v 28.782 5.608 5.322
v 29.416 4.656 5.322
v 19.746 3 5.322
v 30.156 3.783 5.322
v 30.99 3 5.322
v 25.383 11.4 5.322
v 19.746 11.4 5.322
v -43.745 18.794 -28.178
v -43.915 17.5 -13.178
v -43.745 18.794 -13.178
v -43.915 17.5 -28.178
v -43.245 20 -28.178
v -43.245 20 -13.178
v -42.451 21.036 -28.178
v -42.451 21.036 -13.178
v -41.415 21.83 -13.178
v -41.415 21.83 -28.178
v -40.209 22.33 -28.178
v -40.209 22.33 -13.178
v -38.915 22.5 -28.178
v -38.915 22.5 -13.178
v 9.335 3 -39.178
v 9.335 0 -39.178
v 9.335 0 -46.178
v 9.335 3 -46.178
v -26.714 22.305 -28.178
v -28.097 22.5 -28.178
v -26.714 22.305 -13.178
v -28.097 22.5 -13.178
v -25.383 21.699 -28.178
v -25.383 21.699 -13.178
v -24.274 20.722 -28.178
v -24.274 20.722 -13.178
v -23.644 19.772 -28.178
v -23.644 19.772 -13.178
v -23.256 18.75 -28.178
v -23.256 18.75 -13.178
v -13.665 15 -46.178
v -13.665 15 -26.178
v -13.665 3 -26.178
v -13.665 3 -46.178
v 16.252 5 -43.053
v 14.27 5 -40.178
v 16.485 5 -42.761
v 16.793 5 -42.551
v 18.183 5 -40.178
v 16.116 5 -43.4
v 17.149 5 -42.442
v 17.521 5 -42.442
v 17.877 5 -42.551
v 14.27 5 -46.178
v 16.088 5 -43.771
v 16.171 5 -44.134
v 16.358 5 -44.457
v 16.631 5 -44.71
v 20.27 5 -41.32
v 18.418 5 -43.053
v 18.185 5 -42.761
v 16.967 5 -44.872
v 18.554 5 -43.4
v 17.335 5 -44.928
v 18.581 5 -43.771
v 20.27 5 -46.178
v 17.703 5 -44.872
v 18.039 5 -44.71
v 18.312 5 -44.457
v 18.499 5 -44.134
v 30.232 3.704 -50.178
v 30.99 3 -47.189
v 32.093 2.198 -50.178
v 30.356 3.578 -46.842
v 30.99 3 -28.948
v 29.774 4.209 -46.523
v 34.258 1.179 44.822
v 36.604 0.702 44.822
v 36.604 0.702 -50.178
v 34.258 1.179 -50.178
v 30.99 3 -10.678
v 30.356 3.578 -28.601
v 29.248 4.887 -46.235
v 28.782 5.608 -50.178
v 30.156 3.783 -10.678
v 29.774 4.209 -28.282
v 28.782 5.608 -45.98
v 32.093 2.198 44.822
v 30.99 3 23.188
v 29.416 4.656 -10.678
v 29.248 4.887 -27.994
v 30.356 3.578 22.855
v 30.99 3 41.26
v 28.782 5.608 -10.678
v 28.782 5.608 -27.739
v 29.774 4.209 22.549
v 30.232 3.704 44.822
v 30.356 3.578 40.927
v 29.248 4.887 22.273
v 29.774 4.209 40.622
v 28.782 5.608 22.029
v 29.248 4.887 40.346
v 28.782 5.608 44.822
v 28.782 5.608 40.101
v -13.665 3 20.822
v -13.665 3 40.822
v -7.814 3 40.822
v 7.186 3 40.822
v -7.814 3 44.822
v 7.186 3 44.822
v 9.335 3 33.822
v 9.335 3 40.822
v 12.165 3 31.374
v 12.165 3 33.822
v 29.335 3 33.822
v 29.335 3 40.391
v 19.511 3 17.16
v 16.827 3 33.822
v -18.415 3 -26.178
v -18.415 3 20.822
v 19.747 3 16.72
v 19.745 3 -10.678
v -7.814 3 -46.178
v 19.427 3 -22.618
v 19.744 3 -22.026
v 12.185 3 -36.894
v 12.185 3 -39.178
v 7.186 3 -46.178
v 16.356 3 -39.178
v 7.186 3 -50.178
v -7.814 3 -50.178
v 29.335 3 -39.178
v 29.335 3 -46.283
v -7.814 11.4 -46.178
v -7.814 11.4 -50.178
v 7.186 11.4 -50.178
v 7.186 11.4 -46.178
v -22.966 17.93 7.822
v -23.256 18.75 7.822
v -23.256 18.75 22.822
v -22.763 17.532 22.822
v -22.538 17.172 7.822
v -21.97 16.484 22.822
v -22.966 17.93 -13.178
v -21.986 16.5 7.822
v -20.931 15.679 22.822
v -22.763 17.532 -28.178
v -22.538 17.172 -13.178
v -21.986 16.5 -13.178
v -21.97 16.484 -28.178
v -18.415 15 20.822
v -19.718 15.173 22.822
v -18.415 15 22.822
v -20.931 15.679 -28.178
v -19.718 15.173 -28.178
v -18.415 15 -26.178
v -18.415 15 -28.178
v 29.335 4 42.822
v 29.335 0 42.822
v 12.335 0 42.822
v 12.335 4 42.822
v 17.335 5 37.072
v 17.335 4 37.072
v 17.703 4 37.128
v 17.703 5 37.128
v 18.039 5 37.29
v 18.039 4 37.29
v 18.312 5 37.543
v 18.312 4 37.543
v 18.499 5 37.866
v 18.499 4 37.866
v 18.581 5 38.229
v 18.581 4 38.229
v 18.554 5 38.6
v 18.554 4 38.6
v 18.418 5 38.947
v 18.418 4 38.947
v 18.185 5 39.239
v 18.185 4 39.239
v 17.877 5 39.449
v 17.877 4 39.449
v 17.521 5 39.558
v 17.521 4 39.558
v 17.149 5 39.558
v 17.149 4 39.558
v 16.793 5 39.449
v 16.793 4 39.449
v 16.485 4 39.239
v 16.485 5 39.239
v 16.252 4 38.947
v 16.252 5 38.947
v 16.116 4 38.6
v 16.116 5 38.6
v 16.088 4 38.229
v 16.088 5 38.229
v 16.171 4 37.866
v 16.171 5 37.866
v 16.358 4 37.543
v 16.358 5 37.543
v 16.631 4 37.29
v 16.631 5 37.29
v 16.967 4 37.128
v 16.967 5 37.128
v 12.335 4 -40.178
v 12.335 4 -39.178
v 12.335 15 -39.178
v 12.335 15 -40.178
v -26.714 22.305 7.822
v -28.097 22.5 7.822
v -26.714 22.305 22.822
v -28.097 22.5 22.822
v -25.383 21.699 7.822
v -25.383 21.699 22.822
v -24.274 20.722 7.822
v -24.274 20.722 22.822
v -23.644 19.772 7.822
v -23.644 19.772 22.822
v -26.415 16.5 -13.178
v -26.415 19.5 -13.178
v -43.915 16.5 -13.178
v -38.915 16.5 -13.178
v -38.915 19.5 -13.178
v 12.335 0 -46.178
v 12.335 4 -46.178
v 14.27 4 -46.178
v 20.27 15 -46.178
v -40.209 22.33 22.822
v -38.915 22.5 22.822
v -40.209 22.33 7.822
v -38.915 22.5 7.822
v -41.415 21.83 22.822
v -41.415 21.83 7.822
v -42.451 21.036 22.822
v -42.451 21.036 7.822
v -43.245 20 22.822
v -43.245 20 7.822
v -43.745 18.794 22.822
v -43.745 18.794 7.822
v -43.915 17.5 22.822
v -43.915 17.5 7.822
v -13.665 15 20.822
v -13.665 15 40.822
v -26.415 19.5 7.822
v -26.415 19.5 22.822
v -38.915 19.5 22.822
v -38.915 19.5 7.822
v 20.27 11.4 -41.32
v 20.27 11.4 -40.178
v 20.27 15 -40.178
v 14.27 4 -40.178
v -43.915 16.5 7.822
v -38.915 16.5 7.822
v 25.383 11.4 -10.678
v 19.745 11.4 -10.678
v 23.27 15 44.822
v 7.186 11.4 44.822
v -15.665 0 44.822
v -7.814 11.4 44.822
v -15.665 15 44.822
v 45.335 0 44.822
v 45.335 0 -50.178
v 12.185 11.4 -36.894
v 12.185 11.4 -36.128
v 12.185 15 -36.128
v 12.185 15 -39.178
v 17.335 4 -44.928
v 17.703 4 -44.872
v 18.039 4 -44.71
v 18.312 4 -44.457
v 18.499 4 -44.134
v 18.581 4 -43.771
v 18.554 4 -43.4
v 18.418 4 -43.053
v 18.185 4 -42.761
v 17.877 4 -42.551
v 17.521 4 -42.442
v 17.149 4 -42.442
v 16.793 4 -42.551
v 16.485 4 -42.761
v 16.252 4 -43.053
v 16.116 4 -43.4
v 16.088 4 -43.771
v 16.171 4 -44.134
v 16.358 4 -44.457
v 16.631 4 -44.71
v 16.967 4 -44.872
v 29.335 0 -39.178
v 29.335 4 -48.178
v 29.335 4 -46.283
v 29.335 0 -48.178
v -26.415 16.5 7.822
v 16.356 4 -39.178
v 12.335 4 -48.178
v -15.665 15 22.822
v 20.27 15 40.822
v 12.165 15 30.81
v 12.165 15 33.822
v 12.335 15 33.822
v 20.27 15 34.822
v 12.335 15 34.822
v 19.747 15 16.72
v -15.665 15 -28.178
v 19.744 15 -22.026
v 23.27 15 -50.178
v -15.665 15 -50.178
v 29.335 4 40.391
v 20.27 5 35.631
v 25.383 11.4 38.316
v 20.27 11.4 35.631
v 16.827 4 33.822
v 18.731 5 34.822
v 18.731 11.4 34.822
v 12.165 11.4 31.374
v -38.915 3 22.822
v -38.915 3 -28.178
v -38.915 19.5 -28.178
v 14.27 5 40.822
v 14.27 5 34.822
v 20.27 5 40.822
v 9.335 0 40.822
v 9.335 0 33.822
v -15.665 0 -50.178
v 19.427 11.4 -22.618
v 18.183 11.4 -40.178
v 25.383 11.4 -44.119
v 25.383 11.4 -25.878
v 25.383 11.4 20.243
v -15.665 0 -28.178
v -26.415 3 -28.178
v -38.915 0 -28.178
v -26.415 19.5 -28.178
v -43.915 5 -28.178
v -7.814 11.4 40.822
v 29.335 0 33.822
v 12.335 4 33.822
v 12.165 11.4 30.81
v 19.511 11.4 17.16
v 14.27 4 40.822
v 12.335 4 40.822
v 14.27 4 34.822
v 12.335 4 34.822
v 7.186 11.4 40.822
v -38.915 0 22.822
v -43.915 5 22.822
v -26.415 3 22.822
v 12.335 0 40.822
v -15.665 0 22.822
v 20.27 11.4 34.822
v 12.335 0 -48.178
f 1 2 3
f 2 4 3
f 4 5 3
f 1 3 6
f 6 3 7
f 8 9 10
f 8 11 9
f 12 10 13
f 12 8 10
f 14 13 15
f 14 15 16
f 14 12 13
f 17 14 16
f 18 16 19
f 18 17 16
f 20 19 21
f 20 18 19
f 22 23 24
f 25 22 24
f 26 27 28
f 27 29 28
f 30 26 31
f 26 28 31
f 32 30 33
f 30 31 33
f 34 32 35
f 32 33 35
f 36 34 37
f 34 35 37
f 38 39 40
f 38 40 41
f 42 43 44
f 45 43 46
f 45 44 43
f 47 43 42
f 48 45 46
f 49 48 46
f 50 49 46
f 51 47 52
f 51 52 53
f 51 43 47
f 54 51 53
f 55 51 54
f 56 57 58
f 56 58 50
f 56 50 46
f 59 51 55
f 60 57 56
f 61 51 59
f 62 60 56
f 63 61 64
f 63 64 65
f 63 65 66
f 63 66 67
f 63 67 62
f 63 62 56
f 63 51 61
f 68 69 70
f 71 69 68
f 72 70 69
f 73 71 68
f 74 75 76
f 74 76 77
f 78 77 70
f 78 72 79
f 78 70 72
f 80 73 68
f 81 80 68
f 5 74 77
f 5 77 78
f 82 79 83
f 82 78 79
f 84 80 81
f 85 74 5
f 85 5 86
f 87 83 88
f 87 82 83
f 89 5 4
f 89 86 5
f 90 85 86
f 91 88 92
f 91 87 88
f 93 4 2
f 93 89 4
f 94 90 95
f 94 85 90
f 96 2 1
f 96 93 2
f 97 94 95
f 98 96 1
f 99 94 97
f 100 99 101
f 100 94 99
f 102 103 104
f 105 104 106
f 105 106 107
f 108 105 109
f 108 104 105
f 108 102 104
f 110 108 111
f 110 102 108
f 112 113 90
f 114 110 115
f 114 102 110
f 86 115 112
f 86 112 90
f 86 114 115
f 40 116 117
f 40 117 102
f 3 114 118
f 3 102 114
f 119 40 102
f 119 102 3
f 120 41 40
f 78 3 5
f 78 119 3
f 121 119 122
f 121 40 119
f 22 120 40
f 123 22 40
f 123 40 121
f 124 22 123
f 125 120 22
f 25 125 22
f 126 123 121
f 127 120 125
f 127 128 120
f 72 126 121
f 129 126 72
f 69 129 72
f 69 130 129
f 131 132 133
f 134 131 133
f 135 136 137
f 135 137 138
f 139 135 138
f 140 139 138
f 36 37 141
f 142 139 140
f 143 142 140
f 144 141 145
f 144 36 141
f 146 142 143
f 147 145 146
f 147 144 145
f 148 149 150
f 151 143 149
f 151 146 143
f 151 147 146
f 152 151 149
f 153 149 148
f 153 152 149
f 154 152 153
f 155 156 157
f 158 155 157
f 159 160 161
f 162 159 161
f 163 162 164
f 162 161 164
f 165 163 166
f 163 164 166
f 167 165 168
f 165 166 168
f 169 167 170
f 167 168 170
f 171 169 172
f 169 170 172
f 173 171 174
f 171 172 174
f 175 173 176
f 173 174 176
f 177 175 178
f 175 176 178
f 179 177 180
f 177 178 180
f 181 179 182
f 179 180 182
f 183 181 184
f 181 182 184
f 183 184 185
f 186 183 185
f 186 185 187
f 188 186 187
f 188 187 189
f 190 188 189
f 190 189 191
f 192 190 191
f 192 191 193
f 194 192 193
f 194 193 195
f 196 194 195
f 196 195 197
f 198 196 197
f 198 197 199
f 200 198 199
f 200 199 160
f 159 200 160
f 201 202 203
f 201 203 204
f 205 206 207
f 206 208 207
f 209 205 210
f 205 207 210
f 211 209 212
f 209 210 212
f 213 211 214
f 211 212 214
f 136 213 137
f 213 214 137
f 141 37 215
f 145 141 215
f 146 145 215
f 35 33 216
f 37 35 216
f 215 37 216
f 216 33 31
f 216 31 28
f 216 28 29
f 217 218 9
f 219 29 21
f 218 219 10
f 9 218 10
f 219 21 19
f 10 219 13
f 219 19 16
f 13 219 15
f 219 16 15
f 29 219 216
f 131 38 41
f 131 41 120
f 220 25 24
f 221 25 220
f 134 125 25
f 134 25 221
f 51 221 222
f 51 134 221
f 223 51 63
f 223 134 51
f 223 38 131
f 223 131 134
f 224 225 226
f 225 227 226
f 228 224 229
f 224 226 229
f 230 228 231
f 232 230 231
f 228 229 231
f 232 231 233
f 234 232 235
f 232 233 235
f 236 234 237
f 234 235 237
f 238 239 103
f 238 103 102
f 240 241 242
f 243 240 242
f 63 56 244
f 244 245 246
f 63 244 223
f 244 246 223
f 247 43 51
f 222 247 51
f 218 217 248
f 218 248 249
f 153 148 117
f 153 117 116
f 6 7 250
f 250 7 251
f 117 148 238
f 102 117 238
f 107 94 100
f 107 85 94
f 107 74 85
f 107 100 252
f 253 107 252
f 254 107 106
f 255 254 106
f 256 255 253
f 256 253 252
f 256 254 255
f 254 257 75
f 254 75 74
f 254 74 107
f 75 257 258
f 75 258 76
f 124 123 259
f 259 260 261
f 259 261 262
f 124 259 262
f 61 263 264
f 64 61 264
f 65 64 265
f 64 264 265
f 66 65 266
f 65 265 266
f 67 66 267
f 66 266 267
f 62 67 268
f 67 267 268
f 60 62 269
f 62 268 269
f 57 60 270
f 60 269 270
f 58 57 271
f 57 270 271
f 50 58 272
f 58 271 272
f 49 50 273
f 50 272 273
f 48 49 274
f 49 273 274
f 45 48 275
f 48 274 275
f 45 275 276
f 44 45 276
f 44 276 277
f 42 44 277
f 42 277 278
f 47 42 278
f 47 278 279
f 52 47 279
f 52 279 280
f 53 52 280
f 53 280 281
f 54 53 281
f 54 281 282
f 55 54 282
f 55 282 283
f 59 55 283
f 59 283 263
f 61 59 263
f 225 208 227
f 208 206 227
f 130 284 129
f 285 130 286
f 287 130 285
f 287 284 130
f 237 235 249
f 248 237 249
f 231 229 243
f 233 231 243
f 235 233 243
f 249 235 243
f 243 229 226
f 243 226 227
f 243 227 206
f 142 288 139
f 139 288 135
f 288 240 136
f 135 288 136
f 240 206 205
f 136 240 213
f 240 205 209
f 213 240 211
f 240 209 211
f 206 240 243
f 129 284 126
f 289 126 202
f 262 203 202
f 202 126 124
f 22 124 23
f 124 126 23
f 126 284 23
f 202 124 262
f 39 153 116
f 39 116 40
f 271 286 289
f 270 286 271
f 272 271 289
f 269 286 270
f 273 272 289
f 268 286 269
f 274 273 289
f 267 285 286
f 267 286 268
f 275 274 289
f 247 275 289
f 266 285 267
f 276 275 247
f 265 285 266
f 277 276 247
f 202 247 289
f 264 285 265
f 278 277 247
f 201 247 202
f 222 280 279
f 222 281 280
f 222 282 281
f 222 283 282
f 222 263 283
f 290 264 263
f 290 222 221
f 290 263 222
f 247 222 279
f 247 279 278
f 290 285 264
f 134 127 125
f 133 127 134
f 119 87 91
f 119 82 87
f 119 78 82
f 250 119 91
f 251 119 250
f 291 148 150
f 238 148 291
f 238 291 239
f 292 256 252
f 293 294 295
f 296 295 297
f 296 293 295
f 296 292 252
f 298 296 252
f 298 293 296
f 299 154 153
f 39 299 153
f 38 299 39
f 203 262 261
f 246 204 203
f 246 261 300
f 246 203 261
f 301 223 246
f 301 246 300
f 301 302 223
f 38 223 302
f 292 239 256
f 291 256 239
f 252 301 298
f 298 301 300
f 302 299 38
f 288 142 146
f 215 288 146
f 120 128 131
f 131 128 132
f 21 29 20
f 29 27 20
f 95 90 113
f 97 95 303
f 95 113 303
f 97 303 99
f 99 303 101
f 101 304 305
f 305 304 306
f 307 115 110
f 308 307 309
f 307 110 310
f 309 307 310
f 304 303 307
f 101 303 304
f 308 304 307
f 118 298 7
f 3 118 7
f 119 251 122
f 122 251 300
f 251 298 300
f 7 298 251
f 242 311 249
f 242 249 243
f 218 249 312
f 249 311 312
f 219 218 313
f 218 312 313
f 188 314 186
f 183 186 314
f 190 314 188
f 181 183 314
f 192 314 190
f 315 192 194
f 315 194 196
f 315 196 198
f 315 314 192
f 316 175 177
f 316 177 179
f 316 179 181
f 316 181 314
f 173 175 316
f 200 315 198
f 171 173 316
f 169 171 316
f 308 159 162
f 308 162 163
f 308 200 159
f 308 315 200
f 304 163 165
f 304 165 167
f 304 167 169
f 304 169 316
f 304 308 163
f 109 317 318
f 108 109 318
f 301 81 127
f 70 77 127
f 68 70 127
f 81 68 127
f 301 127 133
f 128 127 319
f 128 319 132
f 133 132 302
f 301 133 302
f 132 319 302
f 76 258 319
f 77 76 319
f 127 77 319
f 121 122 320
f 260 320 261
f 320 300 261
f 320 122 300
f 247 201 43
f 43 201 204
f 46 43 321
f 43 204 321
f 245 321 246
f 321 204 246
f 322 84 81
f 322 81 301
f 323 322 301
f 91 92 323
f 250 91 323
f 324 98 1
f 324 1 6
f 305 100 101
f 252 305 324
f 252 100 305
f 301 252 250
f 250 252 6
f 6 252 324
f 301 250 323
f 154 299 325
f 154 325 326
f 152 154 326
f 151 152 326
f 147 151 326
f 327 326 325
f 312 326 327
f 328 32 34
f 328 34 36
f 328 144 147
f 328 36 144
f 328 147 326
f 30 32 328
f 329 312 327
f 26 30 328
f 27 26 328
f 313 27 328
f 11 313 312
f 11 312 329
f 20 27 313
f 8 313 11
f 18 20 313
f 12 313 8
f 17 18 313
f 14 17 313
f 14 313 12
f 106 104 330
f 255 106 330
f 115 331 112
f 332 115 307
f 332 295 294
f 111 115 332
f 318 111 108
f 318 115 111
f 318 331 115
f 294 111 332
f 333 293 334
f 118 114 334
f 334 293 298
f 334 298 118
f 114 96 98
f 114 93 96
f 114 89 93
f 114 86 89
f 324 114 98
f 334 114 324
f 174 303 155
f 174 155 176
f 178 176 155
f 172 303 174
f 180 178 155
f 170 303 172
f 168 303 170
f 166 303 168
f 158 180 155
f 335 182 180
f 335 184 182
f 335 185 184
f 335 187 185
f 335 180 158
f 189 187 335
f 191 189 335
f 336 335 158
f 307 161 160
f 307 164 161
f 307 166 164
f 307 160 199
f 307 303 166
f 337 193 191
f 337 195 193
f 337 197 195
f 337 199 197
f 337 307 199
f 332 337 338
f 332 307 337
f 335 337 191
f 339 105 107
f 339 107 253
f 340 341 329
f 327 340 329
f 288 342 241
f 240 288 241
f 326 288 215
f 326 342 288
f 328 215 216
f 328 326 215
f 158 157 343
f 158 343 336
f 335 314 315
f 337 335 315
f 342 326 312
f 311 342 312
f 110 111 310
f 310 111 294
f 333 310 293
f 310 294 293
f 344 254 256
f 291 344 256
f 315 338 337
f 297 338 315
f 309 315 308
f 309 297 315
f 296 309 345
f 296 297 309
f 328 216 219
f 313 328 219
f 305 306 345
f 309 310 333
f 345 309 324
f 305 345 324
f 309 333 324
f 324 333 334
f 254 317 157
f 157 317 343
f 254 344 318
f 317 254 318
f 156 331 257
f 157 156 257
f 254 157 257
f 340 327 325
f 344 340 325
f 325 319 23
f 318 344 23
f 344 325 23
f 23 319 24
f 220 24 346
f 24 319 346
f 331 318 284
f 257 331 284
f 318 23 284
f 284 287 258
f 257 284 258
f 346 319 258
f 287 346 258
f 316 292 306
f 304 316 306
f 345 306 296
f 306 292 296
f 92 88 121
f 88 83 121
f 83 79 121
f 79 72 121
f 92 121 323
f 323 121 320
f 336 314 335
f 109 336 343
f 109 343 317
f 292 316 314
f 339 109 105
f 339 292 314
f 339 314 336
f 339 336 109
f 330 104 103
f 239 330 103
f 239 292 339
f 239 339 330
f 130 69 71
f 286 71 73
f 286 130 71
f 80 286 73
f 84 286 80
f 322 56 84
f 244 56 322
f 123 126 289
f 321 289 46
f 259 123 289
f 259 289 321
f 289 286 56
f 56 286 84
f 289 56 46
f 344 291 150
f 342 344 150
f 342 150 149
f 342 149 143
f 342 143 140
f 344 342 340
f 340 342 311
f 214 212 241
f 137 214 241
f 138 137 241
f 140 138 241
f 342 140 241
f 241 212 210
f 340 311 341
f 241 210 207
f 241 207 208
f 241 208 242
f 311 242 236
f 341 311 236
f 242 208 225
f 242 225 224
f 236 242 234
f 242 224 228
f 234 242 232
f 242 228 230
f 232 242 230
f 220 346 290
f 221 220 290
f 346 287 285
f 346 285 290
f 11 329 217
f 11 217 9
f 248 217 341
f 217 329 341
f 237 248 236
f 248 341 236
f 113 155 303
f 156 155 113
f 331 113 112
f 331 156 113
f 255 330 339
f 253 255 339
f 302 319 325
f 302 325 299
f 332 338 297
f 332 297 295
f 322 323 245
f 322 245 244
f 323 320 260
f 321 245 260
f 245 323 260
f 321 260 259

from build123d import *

# Parameters (mm, degrees)
SKETCH1_W                = 95
SKETCH1_H                = 95
BOSS_EXTRUDE1_DEPTH      = 20
SKETCH2_W                = 15
SKETCH2_H                = 8.4
CUT_EXTRUDE1_DEPTH       = 50
CUT_EXTRUDE3_DEPTH       = 100
FILLET1_R                = 10
CUT_EXTRUDE4_DEPTH       = 17
SKETCH8_W                = 15
SKETCH8_H                = 8.4
CUT_EXTRUDE5_DEPTH       = 4
SKETCH9_W                = 15
SKETCH9_H                = 8.4
CUT_EXTRUDE6_DEPTH       = 4
SKETCH10_W               = 15
SKETCH10_H               = 8.4
CUT_EXTRUDE7_DEPTH       = 100
SKETCH11_W               = 15
SKETCH11_H               = 8.4
CUT_EXTRUDE8_DEPTH       = 100
SKETCH12_W               = 96.22761595
SKETCH12_H               = 5
CUT_EXTRUDE9_DEPTH       = 100
SKETCH14_W               = 16
SKETCH14_H               = 8.4
CUT_EXTRUDE10_DEPTH      = 100
SKETCH15_W               = 16
SKETCH15_H               = 8.4
CUT_EXTRUDE11_DEPTH      = 100
SKETCH16_W               = 16
SKETCH16_H               = 8.4
CUT_EXTRUDE13_DEPTH      = 100
CUT_EXTRUDE16_DEPTH      = 12
SKETCH21_W               = 23.779532914
SKETCH21_H               = 2
BOSS_EXTRUDE2_DEPTH      = 12
SKETCH23_W               = 23.759878039
SKETCH23_H               = 2
BOSS_EXTRUDE3_DEPTH      = 12
CUT_EXTRUDE19_DEPTH      = 100
CUT_EXTRUDE19_DEPTH_BACK = 100
SKETCH24_W               = 15
SKETCH24_H               = 8.4
SKETCH26_W               = 20
SKETCH26_H               = 95
BOSS_EXTRUDE4_DEPTH      = 20
SKETCH31_W               = 95
SKETCH31_H               = 20
BOSS_EXTRUDE6_DEPTH      = 10
SKETCH32_W               = 12.5
SKETCH32_H               = 16.5
CUT_EXTRUDE22_DEPTH      = 100
SKETCH33_W               = 3.75
SKETCH33_H               = 20
CUT_EXTRUDE23_DEPTH      = 100
SKETCH34_W               = 26.25
SKETCH34_H               = 12.5
CUT_EXTRUDE24_DEPTH      = 100
SKETCH35_W               = 34
SKETCH35_H               = 47.07285681
CUT_EXTRUDE25_DEPTH      = 22
SKETCH36_W               = 34
SKETCH36_H               = 30.604426896
CUT_EXTRUDE26_DEPTH      = 22
SKETCH37_W               = 26.25
SKETCH37_H               = 21
CUT_EXTRUDE28_DEPTH      = 6
SKETCH38_W               = 5.75
SKETCH38_H               = 22.5
CUT_EXTRUDE29_DEPTH      = 100
CHAMFER1_SIZE            = 5
SKETCH39_W               = 2.070576792
SKETCH39_H               = 87
CUT_EXTRUDE30_DEPTH      = 12
FILLET4_R                = 5
FILLET5_R                = 5
SKETCH40_W               = 4.75
SKETCH40_H               = 47
CUT_EXTRUDE31_DEPTH      = 12
FILLET6_R                = 5
SKETCH46_W               = 17
SKETCH46_H               = 9
CUT_EXTRUDE36_DEPTH      = 4
SKETCH47_R               = 1.25
CUT_EXTRUDE37_DEPTH      = 100
SKETCH48_W               = 6
SKETCH48_H               = 6
CUT_EXTRUDE40_DEPTH      = 10
SKETCH49_W               = 2.104185464
SKETCH49_H               = 6
SKETCH49_W_2             = 2.084530589
CUT_EXTRUDE41_DEPTH      = 20
SKETCH50_W               = 3
SKETCH50_H               = 9
CUT_EXTRUDE42_DEPTH      = 20
SKETCH51_W               = 3
SKETCH51_H               = 15
BOSS_EXTRUDE7_DEPTH      = 2
SKETCH52_W               = 3
SKETCH52_H               = 15
BOSS_EXTRUDE8_DEPTH      = 2


with BuildPart() as part:
    # Sketch1 → Boss-Extrude1 (new body)
    with BuildSketch(Plane(origin=(0, 0, 0), x_dir=(1, 0, 0), z_dir=(0, 1, 0))):
        with Locations((-2.165031067, 2.677660124)):
            Rectangle(SKETCH1_W, SKETCH1_H)
    extrude(amount=BOSS_EXTRUDE1_DEPTH)

    # Sketch2 → Cut-Extrude1 (cut)
    with BuildSketch(Plane(origin=(45.334968933, 0, 0), x_dir=(0, 0, -1), z_dir=(1, 0, 0))):
        with Locations((2.677660124, 7.2)):
            Rectangle(SKETCH2_W, SKETCH2_H)
    extrude(amount=-CUT_EXTRUDE1_DEPTH, mode=Mode.SUBTRACT)

    # Sketch6 → Cut-Extrude3 (cut)
    with BuildSketch(Plane.XY.offset(44.822339876)):
        Polygon((45.334968933, 0), (31.416327077, 1.119733542), (20.334968933, 20), (45.334968933, 20), align=None)
    extrude(amount=-CUT_EXTRUDE3_DEPTH, mode=Mode.SUBTRACT)

    # Fillet1
    # the kernel refuses this fillet: 10 mm, written as the material it adds along each edge
    with BuildSketch(Plane(origin=(31.416327077, 1.119733542, 44.822339876), x_dir=(0.9967796443594351, -0.08018940447888392, 0), z_dir=(0, 0, -1))) as fillet1_piece_1_section:
        with BuildLine():
            CenterArc((FILLET1_R * 0.52046366993, -FILLET1_R), FILLET1_R, 90, 54.990678882)
            Line((-FILLET1_R * 0.298595051697, -FILLET1_R * 0.426290308146), (0, 0))
            Line((0, 0), (FILLET1_R * 0.52046366993, 0))
        make_face()
    fillet1_piece_1 = extrude(amount=95, mode=Mode.PRIVATE)
    fillet1_piece_1 = split(fillet1_piece_1, bisect_by=Plane(origin=(32.462514907, 1.548685907, 4.822339876), z_dir=(0, 0, 1)), keep=Keep.TOP, mode=Mode.PRIVATE)
    fillet1_piece_1 = split(fillet1_piece_1, bisect_by=Plane(origin=(32.462514907, 3, 24.822339876), z_dir=(0, -1, 0)), keep=Keep.TOP, mode=Mode.PRIVATE)
    add(fillet1_piece_1)
    with BuildSketch(Plane(origin=(31.416327077, 1.119733542, 44.822339876), x_dir=(0.9967796443594351, -0.08018940447888392, 0), z_dir=(0, 0, -1))) as fillet1_piece_2_section:
        with BuildLine():
            CenterArc((FILLET1_R * 0.52046366993, -FILLET1_R), FILLET1_R, 90, 54.990678882)
            Line((-FILLET1_R * 0.298595051697, -FILLET1_R * 0.426290308146), (0, 0))
            Line((0, 0), (FILLET1_R * 0.52046366993, 0))
        make_face()
    fillet1_piece_2 = extrude(amount=95, mode=Mode.PRIVATE)
    fillet1_piece_2 = split(fillet1_piece_2, bisect_by=Plane(origin=(29.780943428, 3.965739863, 4.822339876), z_dir=(0, 0, 1)), keep=Keep.TOP, mode=Mode.PRIVATE)
    fillet1_piece_2 = split(fillet1_piece_2, bisect_by=Plane(origin=(29.780943428, 3, 24.822339876), z_dir=(0, 1, 0)), keep=Keep.TOP, mode=Mode.PRIVATE)
    add(fillet1_piece_2)
    with BuildSketch(Plane(origin=(31.416327077, 1.119733542, 44.822339876), x_dir=(0.9967796443594351, -0.08018940447888392, 0), z_dir=(0, 0, -1))) as fillet1_piece_3_section:
        with BuildLine():
            CenterArc((FILLET1_R * 0.52046366993, -FILLET1_R), FILLET1_R, 90, 54.990678882)
            Line((-FILLET1_R * 0.298595051697, -FILLET1_R * 0.426290308146), (0, 0))
            Line((0, 0), (FILLET1_R * 0.52046366993, 0))
        make_face()
    fillet1_piece_3 = extrude(amount=95, mode=Mode.PRIVATE)
    fillet1_piece_3 = split(fillet1_piece_3, bisect_by=Plane(origin=(32.462514907, 1.548685907, -10.177660124), z_dir=(0, 0, 1)), keep=Keep.TOP, mode=Mode.PRIVATE)
    fillet1_piece_3 = split(fillet1_piece_3, bisect_by=Plane(origin=(32.462514907, 1.548685907, 4.822339876), z_dir=(0, 0, -1)), keep=Keep.TOP, mode=Mode.PRIVATE)
    fillet1_piece_3 = split(fillet1_piece_3, bisect_by=Plane(origin=(32.462514907, 3, -2.677660124), z_dir=(0, -1, 0)), keep=Keep.TOP, mode=Mode.PRIVATE)
    add(fillet1_piece_3)
    with BuildSketch(Plane(origin=(31.416327077, 1.119733542, 44.822339876), x_dir=(0.9967796443594351, -0.08018940447888392, 0), z_dir=(0, 0, -1))) as fillet1_piece_4_section:
        with BuildLine():
            CenterArc((FILLET1_R * 0.52046366993, -FILLET1_R), FILLET1_R, 90, 54.990678882)
            Line((-FILLET1_R * 0.298595051697, -FILLET1_R * 0.426290308146), (0, 0))
            Line((0, 0), (FILLET1_R * 0.52046366993, 0))
        make_face()
    fillet1_piece_4 = extrude(amount=95, mode=Mode.PRIVATE)
    fillet1_piece_4 = split(fillet1_piece_4, bisect_by=Plane(origin=(32.462514907, 1.548685907, -10.177660124), z_dir=(0, 0, -1)), keep=Keep.TOP, mode=Mode.PRIVATE)
    fillet1_piece_4 = split(fillet1_piece_4, bisect_by=Plane(origin=(32.462514907, 3, -30.177660124), z_dir=(0, -1, 0)), keep=Keep.TOP, mode=Mode.PRIVATE)
    add(fillet1_piece_4)
    with BuildSketch(Plane(origin=(31.416327077, 1.119733542, 44.822339876), x_dir=(0.9967796443594351, -0.08018940447888392, 0), z_dir=(0, 0, -1))) as fillet1_piece_5_section:
        with BuildLine():
            CenterArc((FILLET1_R * 0.52046366993, -FILLET1_R), FILLET1_R, 90, 54.990678882)
            Line((-FILLET1_R * 0.298595051697, -FILLET1_R * 0.426290308146), (0, 0))
            Line((0, 0), (FILLET1_R * 0.52046366993, 0))
        make_face()
    fillet1_piece_5 = extrude(amount=95, mode=Mode.PRIVATE)
    fillet1_piece_5 = split(fillet1_piece_5, bisect_by=Plane(origin=(29.780943428, 3.965739863, -10.177660124), z_dir=(0, 0, -1)), keep=Keep.TOP, mode=Mode.PRIVATE)
    fillet1_piece_5 = split(fillet1_piece_5, bisect_by=Plane(origin=(29.780943428, 3, -30.177660124), z_dir=(0, 1, 0)), keep=Keep.TOP, mode=Mode.PRIVATE)
    add(fillet1_piece_5)

    # Sketch7 → Cut-Extrude4 (cut)
    with BuildSketch(Plane(origin=(0, 20, 0), x_dir=(1, 0, 0), z_dir=(0, 1, 0))):
        Polygon((11.360713437, -29.822339876), (18.334968933, -16.542288661), (9.481601456, -11.892784997), (2.50734596, -25.172836212), align=None)
        Polygon((18.334968933, 22.020257336), (11.132000664, 35.177660124), (2.360398805, 30.375681278), (9.563367074, 17.21827849), align=None)
    extrude(amount=-CUT_EXTRUDE4_DEPTH, mode=Mode.SUBTRACT)

    # Sketch8 → Cut-Extrude5 (cut)
    with BuildSketch(Plane(origin=(12.327397833, 0, 6.473952599), x_dir=(0.4649503663833249, 0, -0.885336747684186), z_dir=(0.8853367476841859, 0, 0.4649503663833248))):
        with Locations((-13.620645519, 7.2)):
            Rectangle(SKETCH8_W, SKETCH8_H)
    extrude(amount=-CUT_EXTRUDE5_DEPTH, mode=Mode.SUBTRACT)

    # Sketch9 → Cut-Extrude6 (cut)
    with BuildSketch(Plane(origin=(14.610669282, 0, -7.99855328), x_dir=(-0.48019788460400603, 0, -0.8771601858394155), z_dir=(0.8771601858394155, 0, -0.48019788460400603))):
        with Locations((18.010879722, 7.2)):
            Rectangle(SKETCH9_W, SKETCH9_H)
    extrude(amount=-CUT_EXTRUDE6_DEPTH, mode=Mode.SUBTRACT)

    # Sketch10 → Cut-Extrude7 (cut)
    with BuildSketch(Plane(origin=(8.786050842, 0, 4.614151134), x_dir=(0.464950366383325, 0, -0.8853367476841859), z_dir=(0.8853367476841859, 0, 0.464950366383325))):
        with Locations((-13.620645519, 7.2)):
            Rectangle(SKETCH10_W, SKETCH10_H)
    extrude(amount=CUT_EXTRUDE7_DEPTH, mode=Mode.SUBTRACT)

    # Sketch11 → Cut-Extrude8 (cut)
    with BuildSketch(Plane(origin=(11.102028539, 0, -6.077761742), x_dir=(-0.48019788460400603, 0, -0.8771601858394155), z_dir=(0.8771601858394155, 0, -0.48019788460400603))):
        with Locations((18.010879722, 7.2)):
            Rectangle(SKETCH11_W, SKETCH11_H)
    extrude(amount=CUT_EXTRUDE8_DEPTH, mode=Mode.SUBTRACT)

    # Sketch12 → Cut-Extrude9 (cut)
    with BuildSketch(Plane.XY.offset(44.822339876)):
        with Locations((-1.551223092, 17.5)):
            Rectangle(SKETCH12_W, SKETCH12_H)
    extrude(amount=-CUT_EXTRUDE9_DEPTH, mode=Mode.SUBTRACT)

    # Sketch14 → Cut-Extrude10 (cut)
    with BuildSketch(Plane(origin=(11.102028539, 0, -6.077761742), x_dir=(-0.48019788460400603, 0, -0.8771601858394155), z_dir=(0.8771601858394155, 0, -0.48019788460400603))):
        with Locations((18.510879722, 7.2)):
            Rectangle(SKETCH14_W, SKETCH14_H)
    extrude(amount=CUT_EXTRUDE10_DEPTH, mode=Mode.SUBTRACT)

    # Sketch15 → Cut-Extrude11 (cut)
    with BuildSketch(Plane(origin=(8.786050842, 0, 4.614151134), x_dir=(0.464950366383325, 0, -0.8853367476841859), z_dir=(0.8853367476841859, 0, 0.464950366383325))):
        with Locations((-14.120645519, 7.2)):
            Rectangle(SKETCH15_W, SKETCH15_H)
    extrude(amount=CUT_EXTRUDE11_DEPTH, mode=Mode.SUBTRACT)

    # Sketch16 → Cut-Extrude13 (cut)
    with BuildSketch(Plane(origin=(-4.665031067, 0, 0), x_dir=(0, 0, -1), z_dir=(1, 0, 0))):
        with Locations((2.677660124, 7.2)):
            Rectangle(SKETCH16_W, SKETCH16_H)
    extrude(amount=CUT_EXTRUDE13_DEPTH, mode=Mode.SUBTRACT)

    # Sketch19 → Cut-Extrude16 (cut)
    with BuildSketch(Plane(origin=(0, 15, 0), x_dir=(1, 0, 0), z_dir=(0, 1, 0))):
        Polygon((12.165423764, -30.809704699), (19.747212292, -16.720116958), (19.744163962, 22.025988312), (12.185078639, 36.127769372), (12.185078639, 48.177660124), (-11.594454275, 48.177660124), (-11.594454275, -42.822339876), (12.165423764, -42.822339876), align=None)
    extrude(amount=-CUT_EXTRUDE16_DEPTH, mode=Mode.SUBTRACT)

    # Sketch21 → Boss-Extrude2 (add)
    with BuildSketch(Plane(origin=(0, 3, 0), x_dir=(1, 0, 0), z_dir=(0, 1, 0))):
        with Locations((0.295312182, 47.177660124)):
            Rectangle(SKETCH21_W, SKETCH21_H)
    extrude(amount=BOSS_EXTRUDE2_DEPTH)

    # Sketch23 → Boss-Extrude3 (add)
    with BuildSketch(Plane(origin=(0, 3, 0), x_dir=(1, 0, 0), z_dir=(0, 1, 0))):
        with Locations((0.285484745, -41.822339876)):
            Rectangle(SKETCH23_W, SKETCH23_H)
    extrude(amount=BOSS_EXTRUDE3_DEPTH)

    # Sketch24 → Cut-Extrude19 (cut, two sides: drawn at the far end of the back side and taken through both)
    with BuildSketch(Plane.XY.offset(-46.177660124).offset(-CUT_EXTRUDE19_DEPTH_BACK)):
        with Locations((-0.314454275, 7.2)):
            Rectangle(SKETCH24_W, SKETCH24_H)
    extrude(amount=CUT_EXTRUDE19_DEPTH + CUT_EXTRUDE19_DEPTH_BACK, mode=Mode.SUBTRACT)

    # Sketch26 → Boss-Extrude4 (add)
    with BuildSketch(Plane(origin=(0, 15, 0), x_dir=(1, 0, 0), z_dir=(0, 1, 0))):
        with Locations((-39.665031067, 2.677660124)):
            Rectangle(SKETCH26_W, SKETCH26_H)
    extrude(amount=BOSS_EXTRUDE4_DEPTH)

    # Sketch31 → Boss-Extrude6 (add)
    with BuildSketch(Plane(origin=(-29.665031067, 0, 0), x_dir=(0, 0, -1), z_dir=(1, 0, 0))):
        with Locations((2.677660124, 25)):
            Rectangle(SKETCH31_W, SKETCH31_H)
    extrude(amount=BOSS_EXTRUDE6_DEPTH)

    # Sketch32 → Cut-Extrude22 (cut)
    with BuildSketch(Plane(origin=(0, 0, -50.177660124), x_dir=(-1, 0, 0), z_dir=(0, 0, -1))):
        with Locations((32.665031067, 11.25)):
            Rectangle(SKETCH32_W, SKETCH32_H)
    extrude(amount=-CUT_EXTRUDE22_DEPTH, mode=Mode.SUBTRACT)

    # Sketch33 → Cut-Extrude23 (cut)
    with BuildSketch(Plane(origin=(0, 0, -50.177660124), x_dir=(-1, 0, 0), z_dir=(0, 0, -1))):
        with Locations((21.540031067, 25)):
            Rectangle(SKETCH33_W, SKETCH33_H)
    extrude(amount=-CUT_EXTRUDE23_DEPTH, mode=Mode.SUBTRACT)

    # Sketch34 → Cut-Extrude24 (cut)
    with BuildSketch(Plane(origin=(0, 0, -50.177660124), x_dir=(-1, 0, 0), z_dir=(0, 0, -1))):
        with Locations((36.540031067, 28.75)):
            Rectangle(SKETCH34_W, SKETCH34_H)
    extrude(amount=-CUT_EXTRUDE24_DEPTH, mode=Mode.SUBTRACT)

    # Sketch35 → Cut-Extrude25 (cut)
    with BuildSketch(Plane(origin=(0, 0, -50.177660124), x_dir=(-1, 0, 0), z_dir=(0, 0, -1))):
        with Locations((32.665031067, 23.536428405)):
            Rectangle(SKETCH35_W, SKETCH35_H)
    extrude(amount=-CUT_EXTRUDE25_DEPTH, mode=Mode.SUBTRACT)

    # Sketch36 → Cut-Extrude26 (cut)
    with BuildSketch(Plane.XY.offset(44.822339876)):
        with Locations((-32.665031067, 15.302213448)):
            Rectangle(SKETCH36_W, SKETCH36_H)
    extrude(amount=-CUT_EXTRUDE26_DEPTH, mode=Mode.SUBTRACT)

    # Sketch37 → Cut-Extrude28 (cut)
    with BuildSketch(Plane(origin=(0, 22.5, 0), x_dir=(1, 0, 0), z_dir=(0, 1, 0))):
        with Locations((-36.540031067, 2.677660124)):
            Rectangle(SKETCH37_W, SKETCH37_H)
    extrude(amount=-CUT_EXTRUDE28_DEPTH, mode=Mode.SUBTRACT)

    # Sketch38 → Cut-Extrude29 (cut)
    with BuildSketch(Plane.XY.offset(22.822339876)):
        with Locations((-46.790031067, 11.25)):
            Rectangle(SKETCH38_W, SKETCH38_H)
    extrude(amount=-CUT_EXTRUDE29_DEPTH, mode=Mode.SUBTRACT)

    # Chamfer1
    chamfer1_edges = [part.edges().sort_by_distance(p)[0] for p in [
        (-43.915031067, 0, -2.677660124),
    ]]
    chamfer(chamfer1_edges, length=CHAMFER1_SIZE)

    # Sketch39 → Cut-Extrude30 (cut)
    with BuildSketch(Plane(origin=(0, 15, 0), x_dir=(1, 0, 0), z_dir=(0, 1, 0))):
        with Locations((-12.629742671, 2.677660124)):
            Rectangle(SKETCH39_W, SKETCH39_H)
    extrude(amount=-CUT_EXTRUDE30_DEPTH, mode=Mode.SUBTRACT)

    # Fillet4
    # the kernel refuses this fillet: 5 mm, written as the material it adds along each edge
    with BuildSketch(Plane(origin=(-23.415031067, 15, -28.177660124), x_dir=(1, 0, 0), z_dir=(0, 0, 1))) as fillet4_piece_1_section:
        with BuildLine():
            CenterArc((FILLET4_R, FILLET4_R), FILLET4_R, 180, 90)
            Line((0, FILLET4_R), (0, 0))
            Line((0, 0), (FILLET4_R, 0))
        make_face()
    fillet4_piece_1 = extrude(amount=51, mode=Mode.PRIVATE)
    fillet4_piece_1 = split(fillet4_piece_1, bisect_by=Plane(origin=(-21.940460429, 15.541584114, -13.177660124), z_dir=(0, 0, -1)), keep=Keep.TOP, mode=Mode.PRIVATE)
    fillet4_piece_1 = split(fillet4_piece_1, bisect_by=Plane(origin=(-21.940460429, 16.5, -20.677660124), z_dir=(0, -1, 0)), keep=Keep.TOP, mode=Mode.PRIVATE)
    add(fillet4_piece_1)
    with BuildSketch(Plane(origin=(-23.415031067, 15, -28.177660124), x_dir=(1, 0, 0), z_dir=(0, 0, 1))) as fillet4_piece_2_section:
        with BuildLine():
            CenterArc((FILLET4_R, FILLET4_R), FILLET4_R, 180, 90)
            Line((0, FILLET4_R), (0, 0))
            Line((0, 0), (FILLET4_R, 0))
        make_face()
    fillet4_piece_2 = extrude(amount=51, mode=Mode.PRIVATE)
    fillet4_piece_2 = split(fillet4_piece_2, bisect_by=Plane(origin=(-23.084676974, 17.513403735, -13.177660124), z_dir=(0, 0, -1)), keep=Keep.TOP, mode=Mode.PRIVATE)
    fillet4_piece_2 = split(fillet4_piece_2, bisect_by=Plane(origin=(-23.084676974, 16.5, -20.677660124), z_dir=(0, 1, 0)), keep=Keep.TOP, mode=Mode.PRIVATE)
    add(fillet4_piece_2)
    with BuildSketch(Plane(origin=(-23.415031067, 15, -28.177660124), x_dir=(1, 0, 0), z_dir=(0, 0, 1))) as fillet4_piece_3_section:
        with BuildLine():
            CenterArc((FILLET4_R, FILLET4_R), FILLET4_R, 180, 90)
            Line((0, FILLET4_R), (0, 0))
            Line((0, 0), (FILLET4_R, 0))
        make_face()
    fillet4_piece_3 = extrude(amount=51, mode=Mode.PRIVATE)
    fillet4_piece_3 = split(fillet4_piece_3, bisect_by=Plane(origin=(-21.940460429, 15.541584114, -13.177660124), z_dir=(0, 0, 1)), keep=Keep.TOP, mode=Mode.PRIVATE)
    fillet4_piece_3 = split(fillet4_piece_3, bisect_by=Plane(origin=(-21.940460429, 16.5, -2.677660124), z_dir=(0, -1, 0)), keep=Keep.TOP, mode=Mode.PRIVATE)
    fillet4_piece_3 = split(fillet4_piece_3, bisect_by=Plane(origin=(-21.940460429, 15.541584114, 7.822339876), z_dir=(0, 0, -1)), keep=Keep.TOP, mode=Mode.PRIVATE)
    add(fillet4_piece_3)
    with BuildSketch(Plane(origin=(-23.415031067, 15, -28.177660124), x_dir=(1, 0, 0), z_dir=(0, 0, 1))) as fillet4_piece_4_section:
        with BuildLine():
            CenterArc((FILLET4_R, FILLET4_R), FILLET4_R, 180, 90)
            Line((0, FILLET4_R), (0, 0))
            Line((0, 0), (FILLET4_R, 0))
        make_face()
    fillet4_piece_4 = extrude(amount=51, mode=Mode.PRIVATE)
    fillet4_piece_4 = split(fillet4_piece_4, bisect_by=Plane(origin=(-21.940460429, 16.5, 15.322339876), z_dir=(0, -1, 0)), keep=Keep.TOP, mode=Mode.PRIVATE)
    fillet4_piece_4 = split(fillet4_piece_4, bisect_by=Plane(origin=(-21.940460429, 15.541584114, 7.822339876), z_dir=(0, 0, 1)), keep=Keep.TOP, mode=Mode.PRIVATE)
    add(fillet4_piece_4)
    with BuildSketch(Plane(origin=(-23.415031067, 15, -28.177660124), x_dir=(1, 0, 0), z_dir=(0, 0, 1))) as fillet4_piece_5_section:
        with BuildLine():
            CenterArc((FILLET4_R, FILLET4_R), FILLET4_R, 180, 90)
            Line((0, FILLET4_R), (0, 0))
            Line((0, 0), (FILLET4_R, 0))
        make_face()
    fillet4_piece_5 = extrude(amount=51, mode=Mode.PRIVATE)
    fillet4_piece_5 = split(fillet4_piece_5, bisect_by=Plane(origin=(-23.084676974, 16.5, 15.322339876), z_dir=(0, 1, 0)), keep=Keep.TOP, mode=Mode.PRIVATE)
    fillet4_piece_5 = split(fillet4_piece_5, bisect_by=Plane(origin=(-23.084676974, 17.513403735, 7.822339876), z_dir=(0, 0, 1)), keep=Keep.TOP, mode=Mode.PRIVATE)
    add(fillet4_piece_5)

    # Fillet5
    fillet5_edges = [part.edges().sort_by_distance(p)[0] for p in [
        (-23.415031067, 22.5, 15.322339876),
        (-23.415031067, 22.5, -20.677660124),
    ]]
    fillet(fillet5_edges, radius=FILLET5_R)

    # Sketch40 → Cut-Extrude31 (cut)
    with BuildSketch(Plane(origin=(0, 15, 0), x_dir=(1, 0, 0), z_dir=(0, 1, 0))):
        with Locations((-16.040031067, 2.677660124)):
            Rectangle(SKETCH40_W, SKETCH40_H)
    extrude(amount=-CUT_EXTRUDE31_DEPTH, mode=Mode.SUBTRACT)

    # Fillet6
    fillet6_edges = [part.edges().sort_by_distance(p)[0] for p in [
        (-43.915031067, 22.5, -20.677660124),
        (-43.915031067, 22.5, 15.322339876),
    ]]
    fillet(fillet6_edges, radius=FILLET6_R)

    # Sketch46 → Cut-Extrude36 (cut)
    with BuildSketch(Plane(origin=(0, 0, 0), x_dir=(-1, 0, 0), z_dir=(0, -1, 0))):
        with Locations((-20.834968933, -38.322339876)):
            Rectangle(SKETCH46_W, SKETCH46_H)
        with Locations((-20.834968933, 43.677660124)):
            Rectangle(SKETCH46_W, SKETCH46_H)
    extrude(amount=-CUT_EXTRUDE36_DEPTH, mode=Mode.SUBTRACT)

    # Sketch47 → Cut-Extrude37 (cut)
    with BuildSketch(Plane(origin=(0, 4, 0), x_dir=(-1, 0, 0), z_dir=(0, -1, 0))):
        with Locations(Location((-17.334968933, -38.322339876, 0), (0, 0, 90))):
            Circle(SKETCH47_R)
        with Locations(Location((-17.334968933, 43.677660124, 0), (0, 0, 90))):
            Circle(SKETCH47_R)
    extrude(amount=-CUT_EXTRUDE37_DEPTH, mode=Mode.SUBTRACT)

    # Sketch48 → Cut-Extrude40 (cut)
    with BuildSketch(Plane(origin=(0, 15, 0), x_dir=(1, 0, 0), z_dir=(0, 1, 0))):
        with Locations((17.269609228, -37.822339876)):
            Rectangle(SKETCH48_W, SKETCH48_H)
        with Locations((17.269609228, 43.177660124)):
            Rectangle(SKETCH48_W, SKETCH48_H)
    extrude(amount=-CUT_EXTRUDE40_DEPTH, mode=Mode.SUBTRACT)

    # Sketch49 → Cut-Extrude41 (cut)
    with BuildSketch(Plane(origin=(0, 15, 0), x_dir=(1, 0, 0), z_dir=(0, 1, 0))):
        with Locations((13.217516496, -37.822339876)):
            Rectangle(SKETCH49_W, SKETCH49_H)
        with Locations((13.227343934, 43.177660124)):
            Rectangle(SKETCH49_W_2, SKETCH49_H)
    extrude(amount=-CUT_EXTRUDE41_DEPTH, mode=Mode.SUBTRACT)

    # Sketch50 → Cut-Extrude42 (cut)
    with BuildSketch(Plane(origin=(0, 0, 0), x_dir=(-1, 0, 0), z_dir=(0, -1, 0))):
        with Locations((-10.834968933, -38.322339876)):
            Rectangle(SKETCH50_W, SKETCH50_H)
        with Locations((-10.834968933, 43.677660124)):
            Rectangle(SKETCH50_W, SKETCH50_H)
    extrude(amount=-CUT_EXTRUDE42_DEPTH, mode=Mode.SUBTRACT)

    # Sketch51 → Boss-Extrude7 (add)
    with BuildSketch(Plane(origin=(0, 0, 42.822339876), x_dir=(-1, 0, 0), z_dir=(0, 0, -1))):
        with Locations((-10.834968933, 7.5)):
            Rectangle(SKETCH51_W, SKETCH51_H)
    extrude(amount=BOSS_EXTRUDE7_DEPTH)

    # Sketch52 → Boss-Extrude8 (add)
    with BuildSketch(Plane.XY.offset(-48.177660124)):
        with Locations((10.834968933, 7.5)):
            Rectangle(SKETCH52_W, SKETCH52_H)
    extrude(amount=BOSS_EXTRUDE8_DEPTH)


solid = part.part
